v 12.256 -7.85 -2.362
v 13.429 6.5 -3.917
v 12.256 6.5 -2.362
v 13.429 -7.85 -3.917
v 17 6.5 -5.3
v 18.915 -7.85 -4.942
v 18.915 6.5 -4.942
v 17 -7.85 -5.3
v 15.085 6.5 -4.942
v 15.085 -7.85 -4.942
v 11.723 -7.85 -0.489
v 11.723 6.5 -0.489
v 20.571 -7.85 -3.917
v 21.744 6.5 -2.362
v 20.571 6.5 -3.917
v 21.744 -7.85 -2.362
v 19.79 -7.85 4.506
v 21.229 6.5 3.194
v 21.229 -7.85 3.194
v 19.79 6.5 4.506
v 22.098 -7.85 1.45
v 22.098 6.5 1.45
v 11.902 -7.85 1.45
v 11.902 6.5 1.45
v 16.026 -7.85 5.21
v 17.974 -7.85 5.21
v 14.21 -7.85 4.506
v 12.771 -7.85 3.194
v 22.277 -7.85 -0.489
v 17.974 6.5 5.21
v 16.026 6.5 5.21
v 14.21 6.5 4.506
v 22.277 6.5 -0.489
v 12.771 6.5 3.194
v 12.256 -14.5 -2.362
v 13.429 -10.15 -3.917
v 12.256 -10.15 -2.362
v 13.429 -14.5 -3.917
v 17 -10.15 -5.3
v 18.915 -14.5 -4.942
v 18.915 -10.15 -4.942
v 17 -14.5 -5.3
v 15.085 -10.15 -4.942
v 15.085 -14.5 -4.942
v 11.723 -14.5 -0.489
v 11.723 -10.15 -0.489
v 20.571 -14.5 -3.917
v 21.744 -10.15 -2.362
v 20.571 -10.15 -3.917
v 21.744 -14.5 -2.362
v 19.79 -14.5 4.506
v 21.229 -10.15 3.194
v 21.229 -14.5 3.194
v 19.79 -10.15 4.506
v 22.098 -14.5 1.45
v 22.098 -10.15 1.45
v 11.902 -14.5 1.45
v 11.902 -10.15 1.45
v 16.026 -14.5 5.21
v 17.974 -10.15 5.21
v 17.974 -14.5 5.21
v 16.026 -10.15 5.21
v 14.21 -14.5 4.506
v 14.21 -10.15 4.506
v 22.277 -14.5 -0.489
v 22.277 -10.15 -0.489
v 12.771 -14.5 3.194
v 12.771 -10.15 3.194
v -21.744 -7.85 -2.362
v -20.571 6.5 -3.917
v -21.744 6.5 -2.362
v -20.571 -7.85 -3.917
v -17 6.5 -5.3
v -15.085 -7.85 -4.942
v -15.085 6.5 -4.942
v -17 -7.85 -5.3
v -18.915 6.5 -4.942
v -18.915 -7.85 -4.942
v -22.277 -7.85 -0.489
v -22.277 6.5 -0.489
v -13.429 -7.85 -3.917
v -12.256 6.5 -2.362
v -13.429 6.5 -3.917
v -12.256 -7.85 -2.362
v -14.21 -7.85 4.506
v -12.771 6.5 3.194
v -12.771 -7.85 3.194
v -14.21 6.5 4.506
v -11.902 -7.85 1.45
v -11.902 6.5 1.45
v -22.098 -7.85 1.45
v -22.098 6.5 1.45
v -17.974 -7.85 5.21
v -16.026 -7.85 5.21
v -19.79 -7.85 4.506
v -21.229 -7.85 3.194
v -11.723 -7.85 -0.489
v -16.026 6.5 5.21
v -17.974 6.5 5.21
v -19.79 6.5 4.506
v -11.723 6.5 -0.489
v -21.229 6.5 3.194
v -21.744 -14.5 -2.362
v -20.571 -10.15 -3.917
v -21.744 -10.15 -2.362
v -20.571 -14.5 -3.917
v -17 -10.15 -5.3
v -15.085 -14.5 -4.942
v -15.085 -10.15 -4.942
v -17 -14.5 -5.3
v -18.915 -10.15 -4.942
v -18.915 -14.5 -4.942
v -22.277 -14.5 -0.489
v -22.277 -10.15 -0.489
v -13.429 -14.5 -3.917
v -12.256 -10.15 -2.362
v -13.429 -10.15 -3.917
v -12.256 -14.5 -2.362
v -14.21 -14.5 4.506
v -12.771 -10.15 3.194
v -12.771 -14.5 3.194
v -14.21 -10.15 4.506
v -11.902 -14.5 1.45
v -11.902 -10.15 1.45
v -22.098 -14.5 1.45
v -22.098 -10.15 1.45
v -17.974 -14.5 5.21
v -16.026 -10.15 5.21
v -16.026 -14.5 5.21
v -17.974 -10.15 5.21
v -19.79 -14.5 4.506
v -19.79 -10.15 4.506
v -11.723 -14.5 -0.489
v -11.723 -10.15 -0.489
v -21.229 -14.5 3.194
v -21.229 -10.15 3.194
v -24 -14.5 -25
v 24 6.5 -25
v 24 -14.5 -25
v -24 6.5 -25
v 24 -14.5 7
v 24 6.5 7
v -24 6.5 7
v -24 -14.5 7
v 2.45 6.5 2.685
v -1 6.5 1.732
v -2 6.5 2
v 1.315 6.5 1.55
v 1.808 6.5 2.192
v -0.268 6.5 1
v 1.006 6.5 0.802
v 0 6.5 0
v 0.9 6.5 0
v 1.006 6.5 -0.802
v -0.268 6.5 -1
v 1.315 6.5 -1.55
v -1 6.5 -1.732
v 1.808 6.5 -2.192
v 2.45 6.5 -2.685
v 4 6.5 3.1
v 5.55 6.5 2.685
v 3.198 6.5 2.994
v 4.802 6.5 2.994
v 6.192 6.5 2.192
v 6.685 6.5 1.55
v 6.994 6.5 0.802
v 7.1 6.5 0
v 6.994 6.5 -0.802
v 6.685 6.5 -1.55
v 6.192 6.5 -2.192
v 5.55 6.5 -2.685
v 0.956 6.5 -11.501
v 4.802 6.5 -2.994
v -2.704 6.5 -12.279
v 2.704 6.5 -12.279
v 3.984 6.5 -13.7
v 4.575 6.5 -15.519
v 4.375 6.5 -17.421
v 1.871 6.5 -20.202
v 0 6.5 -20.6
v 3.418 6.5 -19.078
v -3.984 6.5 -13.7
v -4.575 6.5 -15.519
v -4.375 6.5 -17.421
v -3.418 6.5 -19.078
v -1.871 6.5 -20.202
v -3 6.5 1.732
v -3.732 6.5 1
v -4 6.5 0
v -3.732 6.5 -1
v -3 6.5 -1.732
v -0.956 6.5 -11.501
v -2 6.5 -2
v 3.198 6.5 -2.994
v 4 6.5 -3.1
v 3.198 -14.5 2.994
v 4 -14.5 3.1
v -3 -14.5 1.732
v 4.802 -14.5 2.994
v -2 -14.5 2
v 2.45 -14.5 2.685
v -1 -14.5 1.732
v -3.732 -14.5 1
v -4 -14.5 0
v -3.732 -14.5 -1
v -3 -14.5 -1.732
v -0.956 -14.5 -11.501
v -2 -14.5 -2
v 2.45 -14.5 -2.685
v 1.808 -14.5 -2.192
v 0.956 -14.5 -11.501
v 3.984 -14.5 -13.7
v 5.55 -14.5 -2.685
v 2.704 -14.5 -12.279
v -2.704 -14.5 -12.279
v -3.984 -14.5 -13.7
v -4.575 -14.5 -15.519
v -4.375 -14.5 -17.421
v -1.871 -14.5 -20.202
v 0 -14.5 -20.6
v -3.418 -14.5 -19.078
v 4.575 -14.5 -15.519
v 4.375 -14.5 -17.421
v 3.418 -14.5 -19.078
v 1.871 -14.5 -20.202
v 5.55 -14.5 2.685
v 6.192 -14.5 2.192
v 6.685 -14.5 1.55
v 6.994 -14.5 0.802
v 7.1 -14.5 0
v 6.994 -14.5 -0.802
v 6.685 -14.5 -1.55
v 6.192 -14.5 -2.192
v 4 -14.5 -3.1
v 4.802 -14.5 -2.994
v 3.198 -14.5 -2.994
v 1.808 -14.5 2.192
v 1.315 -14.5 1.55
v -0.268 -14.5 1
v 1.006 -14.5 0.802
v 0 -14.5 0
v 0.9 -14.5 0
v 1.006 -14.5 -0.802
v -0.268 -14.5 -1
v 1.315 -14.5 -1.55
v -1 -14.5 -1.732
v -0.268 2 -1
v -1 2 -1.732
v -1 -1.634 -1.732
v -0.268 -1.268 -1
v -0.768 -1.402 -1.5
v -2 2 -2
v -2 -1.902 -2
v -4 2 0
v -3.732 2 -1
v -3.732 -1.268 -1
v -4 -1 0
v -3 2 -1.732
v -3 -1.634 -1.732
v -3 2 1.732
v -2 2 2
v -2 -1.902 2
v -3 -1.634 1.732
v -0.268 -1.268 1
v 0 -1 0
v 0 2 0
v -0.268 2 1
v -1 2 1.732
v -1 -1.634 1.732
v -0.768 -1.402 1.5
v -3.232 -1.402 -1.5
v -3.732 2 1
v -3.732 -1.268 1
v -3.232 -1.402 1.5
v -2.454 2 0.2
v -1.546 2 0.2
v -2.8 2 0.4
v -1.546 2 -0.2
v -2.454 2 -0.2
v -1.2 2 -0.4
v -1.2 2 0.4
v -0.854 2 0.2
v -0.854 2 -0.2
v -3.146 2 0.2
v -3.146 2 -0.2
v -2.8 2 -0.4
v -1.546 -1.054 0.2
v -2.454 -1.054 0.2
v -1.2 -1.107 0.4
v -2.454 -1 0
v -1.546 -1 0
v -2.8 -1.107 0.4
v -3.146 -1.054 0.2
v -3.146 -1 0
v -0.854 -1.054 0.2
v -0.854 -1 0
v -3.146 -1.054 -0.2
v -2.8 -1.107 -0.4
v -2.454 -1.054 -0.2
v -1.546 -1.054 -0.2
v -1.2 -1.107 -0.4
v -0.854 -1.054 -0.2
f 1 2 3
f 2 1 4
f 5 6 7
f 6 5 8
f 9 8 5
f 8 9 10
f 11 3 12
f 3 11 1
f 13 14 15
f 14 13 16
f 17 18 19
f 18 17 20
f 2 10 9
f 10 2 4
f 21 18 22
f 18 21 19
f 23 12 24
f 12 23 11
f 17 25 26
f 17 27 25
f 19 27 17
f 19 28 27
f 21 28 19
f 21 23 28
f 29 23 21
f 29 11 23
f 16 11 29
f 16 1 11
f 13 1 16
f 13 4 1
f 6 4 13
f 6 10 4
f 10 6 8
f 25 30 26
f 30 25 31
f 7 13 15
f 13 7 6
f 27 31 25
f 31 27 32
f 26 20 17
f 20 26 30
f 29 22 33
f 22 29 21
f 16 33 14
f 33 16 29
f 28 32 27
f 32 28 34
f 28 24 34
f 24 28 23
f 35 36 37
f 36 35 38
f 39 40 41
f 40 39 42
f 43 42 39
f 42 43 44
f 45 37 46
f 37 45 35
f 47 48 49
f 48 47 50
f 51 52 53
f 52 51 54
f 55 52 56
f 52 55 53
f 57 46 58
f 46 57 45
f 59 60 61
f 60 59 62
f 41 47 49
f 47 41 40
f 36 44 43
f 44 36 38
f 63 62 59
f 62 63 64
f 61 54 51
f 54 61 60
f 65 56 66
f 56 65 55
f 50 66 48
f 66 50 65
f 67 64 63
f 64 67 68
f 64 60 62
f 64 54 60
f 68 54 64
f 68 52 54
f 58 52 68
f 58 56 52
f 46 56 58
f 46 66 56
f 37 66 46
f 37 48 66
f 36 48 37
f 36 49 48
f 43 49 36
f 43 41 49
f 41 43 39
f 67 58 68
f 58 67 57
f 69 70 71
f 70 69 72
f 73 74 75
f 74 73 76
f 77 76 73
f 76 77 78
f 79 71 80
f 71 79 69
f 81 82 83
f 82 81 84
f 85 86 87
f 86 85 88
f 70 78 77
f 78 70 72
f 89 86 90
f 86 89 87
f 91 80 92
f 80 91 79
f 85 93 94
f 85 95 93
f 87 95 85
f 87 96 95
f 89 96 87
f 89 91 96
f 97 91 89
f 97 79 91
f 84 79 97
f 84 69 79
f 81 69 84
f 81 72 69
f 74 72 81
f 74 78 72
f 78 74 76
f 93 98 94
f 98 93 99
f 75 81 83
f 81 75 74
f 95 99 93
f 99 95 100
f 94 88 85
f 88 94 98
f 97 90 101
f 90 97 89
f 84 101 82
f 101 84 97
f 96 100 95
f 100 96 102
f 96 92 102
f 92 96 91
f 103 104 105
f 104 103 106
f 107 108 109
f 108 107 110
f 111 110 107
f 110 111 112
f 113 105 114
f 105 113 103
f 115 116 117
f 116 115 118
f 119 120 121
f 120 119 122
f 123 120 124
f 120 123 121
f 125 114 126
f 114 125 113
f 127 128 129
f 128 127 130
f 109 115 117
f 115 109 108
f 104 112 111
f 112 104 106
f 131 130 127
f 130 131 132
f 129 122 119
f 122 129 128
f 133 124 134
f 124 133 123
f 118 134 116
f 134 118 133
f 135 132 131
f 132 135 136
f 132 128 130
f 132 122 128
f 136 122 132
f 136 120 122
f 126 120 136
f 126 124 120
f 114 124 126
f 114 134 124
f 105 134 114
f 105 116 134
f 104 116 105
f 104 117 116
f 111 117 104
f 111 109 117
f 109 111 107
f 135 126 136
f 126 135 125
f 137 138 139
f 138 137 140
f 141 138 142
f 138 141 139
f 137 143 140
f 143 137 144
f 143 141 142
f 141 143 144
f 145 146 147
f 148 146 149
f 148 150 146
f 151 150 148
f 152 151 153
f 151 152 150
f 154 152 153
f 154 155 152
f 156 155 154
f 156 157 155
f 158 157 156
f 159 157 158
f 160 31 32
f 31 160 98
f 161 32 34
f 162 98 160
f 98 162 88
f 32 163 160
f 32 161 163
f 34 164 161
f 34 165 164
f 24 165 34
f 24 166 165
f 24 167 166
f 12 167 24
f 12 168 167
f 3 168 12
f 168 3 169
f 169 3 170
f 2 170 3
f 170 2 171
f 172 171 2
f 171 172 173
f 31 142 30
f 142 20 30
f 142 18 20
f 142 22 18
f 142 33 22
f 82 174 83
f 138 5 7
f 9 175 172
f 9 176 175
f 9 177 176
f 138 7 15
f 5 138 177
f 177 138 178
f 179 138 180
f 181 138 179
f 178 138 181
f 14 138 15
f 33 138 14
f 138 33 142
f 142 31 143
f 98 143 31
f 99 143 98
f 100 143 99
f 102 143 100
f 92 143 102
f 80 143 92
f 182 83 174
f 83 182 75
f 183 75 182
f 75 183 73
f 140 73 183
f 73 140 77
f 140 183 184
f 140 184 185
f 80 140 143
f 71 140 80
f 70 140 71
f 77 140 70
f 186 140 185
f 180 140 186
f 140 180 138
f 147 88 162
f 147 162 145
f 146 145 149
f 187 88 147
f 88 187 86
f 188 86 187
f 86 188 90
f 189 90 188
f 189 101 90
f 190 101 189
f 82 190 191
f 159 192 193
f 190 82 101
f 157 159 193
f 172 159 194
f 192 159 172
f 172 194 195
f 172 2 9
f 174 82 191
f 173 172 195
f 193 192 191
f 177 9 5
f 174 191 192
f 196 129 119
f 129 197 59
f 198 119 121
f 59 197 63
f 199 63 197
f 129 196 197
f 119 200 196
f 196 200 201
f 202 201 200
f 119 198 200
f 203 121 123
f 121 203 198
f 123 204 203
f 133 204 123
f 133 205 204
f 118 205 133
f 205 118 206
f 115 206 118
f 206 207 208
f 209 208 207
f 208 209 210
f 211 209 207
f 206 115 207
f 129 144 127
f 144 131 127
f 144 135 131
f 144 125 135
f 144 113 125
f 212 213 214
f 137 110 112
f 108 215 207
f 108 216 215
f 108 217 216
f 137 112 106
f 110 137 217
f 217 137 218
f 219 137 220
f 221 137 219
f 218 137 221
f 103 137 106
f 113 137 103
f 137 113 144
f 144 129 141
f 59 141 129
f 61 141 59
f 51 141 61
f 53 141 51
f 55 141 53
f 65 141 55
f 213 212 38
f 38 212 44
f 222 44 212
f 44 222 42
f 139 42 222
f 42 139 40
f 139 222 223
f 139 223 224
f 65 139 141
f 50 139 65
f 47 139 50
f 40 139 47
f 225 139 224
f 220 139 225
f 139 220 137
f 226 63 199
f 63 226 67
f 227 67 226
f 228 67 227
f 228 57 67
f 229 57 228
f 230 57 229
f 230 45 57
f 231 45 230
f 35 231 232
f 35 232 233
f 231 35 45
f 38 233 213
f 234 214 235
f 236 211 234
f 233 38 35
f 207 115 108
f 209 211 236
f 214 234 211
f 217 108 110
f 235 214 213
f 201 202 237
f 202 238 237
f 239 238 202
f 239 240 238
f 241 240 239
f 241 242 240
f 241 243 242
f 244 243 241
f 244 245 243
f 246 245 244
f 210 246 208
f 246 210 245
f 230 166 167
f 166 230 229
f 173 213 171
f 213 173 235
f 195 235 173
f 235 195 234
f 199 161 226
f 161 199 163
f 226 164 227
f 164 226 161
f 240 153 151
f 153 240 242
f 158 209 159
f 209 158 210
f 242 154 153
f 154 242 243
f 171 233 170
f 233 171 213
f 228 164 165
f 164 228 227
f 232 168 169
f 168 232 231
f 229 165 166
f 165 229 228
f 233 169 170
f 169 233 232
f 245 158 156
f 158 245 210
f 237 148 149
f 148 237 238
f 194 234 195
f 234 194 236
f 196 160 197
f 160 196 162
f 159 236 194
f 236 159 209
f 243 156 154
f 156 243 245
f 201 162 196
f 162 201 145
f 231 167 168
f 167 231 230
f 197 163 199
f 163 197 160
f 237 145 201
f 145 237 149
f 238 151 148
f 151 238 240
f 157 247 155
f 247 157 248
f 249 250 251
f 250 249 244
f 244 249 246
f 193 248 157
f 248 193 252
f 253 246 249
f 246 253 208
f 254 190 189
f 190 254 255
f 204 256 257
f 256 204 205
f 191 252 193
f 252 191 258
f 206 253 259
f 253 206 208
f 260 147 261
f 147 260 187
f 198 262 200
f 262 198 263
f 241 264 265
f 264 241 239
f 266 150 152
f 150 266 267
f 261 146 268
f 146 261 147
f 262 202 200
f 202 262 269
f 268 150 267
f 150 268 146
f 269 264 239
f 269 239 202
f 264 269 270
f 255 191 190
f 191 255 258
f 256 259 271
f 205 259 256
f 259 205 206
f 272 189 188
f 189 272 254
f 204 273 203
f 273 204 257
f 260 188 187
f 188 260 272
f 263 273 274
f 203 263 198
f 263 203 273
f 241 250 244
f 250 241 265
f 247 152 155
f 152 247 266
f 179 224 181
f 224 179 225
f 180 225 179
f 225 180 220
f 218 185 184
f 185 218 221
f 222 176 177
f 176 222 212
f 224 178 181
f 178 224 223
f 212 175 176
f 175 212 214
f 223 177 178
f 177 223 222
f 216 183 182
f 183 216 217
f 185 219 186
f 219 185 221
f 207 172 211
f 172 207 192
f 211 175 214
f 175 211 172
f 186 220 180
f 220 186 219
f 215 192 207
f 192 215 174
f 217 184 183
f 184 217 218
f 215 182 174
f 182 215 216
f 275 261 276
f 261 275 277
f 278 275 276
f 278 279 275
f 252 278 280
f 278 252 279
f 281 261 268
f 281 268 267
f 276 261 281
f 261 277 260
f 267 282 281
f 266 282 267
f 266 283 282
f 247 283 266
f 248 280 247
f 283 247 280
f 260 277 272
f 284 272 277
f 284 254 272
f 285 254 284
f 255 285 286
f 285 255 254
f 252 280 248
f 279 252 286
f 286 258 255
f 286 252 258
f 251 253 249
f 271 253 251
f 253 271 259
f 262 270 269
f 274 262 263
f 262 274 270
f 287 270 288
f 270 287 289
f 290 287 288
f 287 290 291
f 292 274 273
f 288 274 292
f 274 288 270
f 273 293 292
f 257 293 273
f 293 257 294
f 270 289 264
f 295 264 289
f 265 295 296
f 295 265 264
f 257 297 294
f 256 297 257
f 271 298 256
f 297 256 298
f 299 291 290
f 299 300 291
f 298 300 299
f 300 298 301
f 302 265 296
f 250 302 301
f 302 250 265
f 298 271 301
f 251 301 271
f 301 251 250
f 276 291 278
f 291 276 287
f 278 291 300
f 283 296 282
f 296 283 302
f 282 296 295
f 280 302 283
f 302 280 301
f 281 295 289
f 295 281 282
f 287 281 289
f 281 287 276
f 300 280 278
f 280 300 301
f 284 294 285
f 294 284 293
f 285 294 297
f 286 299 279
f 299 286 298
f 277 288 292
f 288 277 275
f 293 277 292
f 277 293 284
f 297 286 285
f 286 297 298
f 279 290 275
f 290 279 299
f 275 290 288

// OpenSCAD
diameter=10;
height=4;
number=3;
distance=5;
baseline=30; 


module maghole(diameter,height,number,back) {
		translate([0,height*(number-2)/2,0])
        rotate([90,0,0])
         cylinder(r=diameter/2,h=height*(2*number-1),center=true);
    if(back == 1) {
		translate([0,-height*2*(number+1)/2,0])
        rotate([90,0,0])
         cylinder(r=diameter/2,h=height*number,center=true);
    }
}

module smaghole(diameter,height,number,back) {
		translate([0,.15+height*(number-2)/2,0])
        rotate([90,0,0])
         cylinder(r=0.3+diameter/2,h=height*(2*number-1),center=true);
    if(back == 1) {
		translate([0,-(0.15+height*2*(number+1)/2),0])
        rotate([90,0,0])
         cylinder(r=0.3+diameter/2,h=height*number,center=true);
    }
}
module mirror(diameter,height,number,distance,baseline) {
width=diameter+4;
depth=distance+height*number+4;
length=baseline+diameter+8;
mirrorthick = 2.6;
   difference() {
     translate([0,-height,0])
	   cube([width,  // Small dimension
            depth, // Optical path dim
		      length],center=true);
      translate([0,0,2+baseline/2])
             maghole(diameter,height,number,0);
     translate([0,0,-(2+baseline/2)])
             maghole(diameter,height,number,0);
     translate([0,depth/4,0])
          cube([width+2,depth+2,length-2*width],center=true);
    rotate([7,0,0])
     translate([0,0.6-depth/3,0.75])
          cube([width+2,mirrorthick+0.5,length-(2*diameter+5)],center=true);
     }
}

module sensor(diameter,height,number,distance,baseline) {
width=diameter+4;
depth=distance+height*number+4;
length=baseline+diameter+8;
mirrorthick = 2.6;
extra=2*width+4;

   difference() {
     translate([2+width/2,-height,0])
	   cube([extra,  // Small dimension
            depth, // Optical path dim
		      length],center=true);
      translate([0,0,2+baseline/2])
             smaghole(diameter,height,number,1);
     translate([0,0,-(2+baseline/2)])
             smaghole(diameter,height,number,1);
//LASER
     translate([0,0,4])
        rotate([90,0,0])
             cylinder(r=3.1,h=40,center=true,$fn=24);
//PhotoTransistor
     translate([0,0,-2])
        rotate([90,0,0])
             cylinder(r=2,h=40,center=true,$fn=12);
// TEMP SENSOR
     translate([2+width,0,0])
        rotate([90,0,0])
             cylinder(r=4.6,h=40,center=true);

     }

     difference() {
     translate([0,-1,-2.5])cube([5,6,5],center=true);
     translate([0,-4,0])
        cylinder(r=3,h=10,center=true,$fn=12);
     translate([0,0,-1.2])
        rotate([90,0,0])
             cylinder(r=0.4,h=40,center=true,$fn=6);
     translate([0,0,-2.8])
        rotate([90,0,0])
             cylinder(r=0.4,h=40,center=true,$fn=6);
     }
}

rotate([0,90,0])
  // mirror(diameter,height,number,distance,baseline);
     sensor(diameter,height,number,distance,baseline);
